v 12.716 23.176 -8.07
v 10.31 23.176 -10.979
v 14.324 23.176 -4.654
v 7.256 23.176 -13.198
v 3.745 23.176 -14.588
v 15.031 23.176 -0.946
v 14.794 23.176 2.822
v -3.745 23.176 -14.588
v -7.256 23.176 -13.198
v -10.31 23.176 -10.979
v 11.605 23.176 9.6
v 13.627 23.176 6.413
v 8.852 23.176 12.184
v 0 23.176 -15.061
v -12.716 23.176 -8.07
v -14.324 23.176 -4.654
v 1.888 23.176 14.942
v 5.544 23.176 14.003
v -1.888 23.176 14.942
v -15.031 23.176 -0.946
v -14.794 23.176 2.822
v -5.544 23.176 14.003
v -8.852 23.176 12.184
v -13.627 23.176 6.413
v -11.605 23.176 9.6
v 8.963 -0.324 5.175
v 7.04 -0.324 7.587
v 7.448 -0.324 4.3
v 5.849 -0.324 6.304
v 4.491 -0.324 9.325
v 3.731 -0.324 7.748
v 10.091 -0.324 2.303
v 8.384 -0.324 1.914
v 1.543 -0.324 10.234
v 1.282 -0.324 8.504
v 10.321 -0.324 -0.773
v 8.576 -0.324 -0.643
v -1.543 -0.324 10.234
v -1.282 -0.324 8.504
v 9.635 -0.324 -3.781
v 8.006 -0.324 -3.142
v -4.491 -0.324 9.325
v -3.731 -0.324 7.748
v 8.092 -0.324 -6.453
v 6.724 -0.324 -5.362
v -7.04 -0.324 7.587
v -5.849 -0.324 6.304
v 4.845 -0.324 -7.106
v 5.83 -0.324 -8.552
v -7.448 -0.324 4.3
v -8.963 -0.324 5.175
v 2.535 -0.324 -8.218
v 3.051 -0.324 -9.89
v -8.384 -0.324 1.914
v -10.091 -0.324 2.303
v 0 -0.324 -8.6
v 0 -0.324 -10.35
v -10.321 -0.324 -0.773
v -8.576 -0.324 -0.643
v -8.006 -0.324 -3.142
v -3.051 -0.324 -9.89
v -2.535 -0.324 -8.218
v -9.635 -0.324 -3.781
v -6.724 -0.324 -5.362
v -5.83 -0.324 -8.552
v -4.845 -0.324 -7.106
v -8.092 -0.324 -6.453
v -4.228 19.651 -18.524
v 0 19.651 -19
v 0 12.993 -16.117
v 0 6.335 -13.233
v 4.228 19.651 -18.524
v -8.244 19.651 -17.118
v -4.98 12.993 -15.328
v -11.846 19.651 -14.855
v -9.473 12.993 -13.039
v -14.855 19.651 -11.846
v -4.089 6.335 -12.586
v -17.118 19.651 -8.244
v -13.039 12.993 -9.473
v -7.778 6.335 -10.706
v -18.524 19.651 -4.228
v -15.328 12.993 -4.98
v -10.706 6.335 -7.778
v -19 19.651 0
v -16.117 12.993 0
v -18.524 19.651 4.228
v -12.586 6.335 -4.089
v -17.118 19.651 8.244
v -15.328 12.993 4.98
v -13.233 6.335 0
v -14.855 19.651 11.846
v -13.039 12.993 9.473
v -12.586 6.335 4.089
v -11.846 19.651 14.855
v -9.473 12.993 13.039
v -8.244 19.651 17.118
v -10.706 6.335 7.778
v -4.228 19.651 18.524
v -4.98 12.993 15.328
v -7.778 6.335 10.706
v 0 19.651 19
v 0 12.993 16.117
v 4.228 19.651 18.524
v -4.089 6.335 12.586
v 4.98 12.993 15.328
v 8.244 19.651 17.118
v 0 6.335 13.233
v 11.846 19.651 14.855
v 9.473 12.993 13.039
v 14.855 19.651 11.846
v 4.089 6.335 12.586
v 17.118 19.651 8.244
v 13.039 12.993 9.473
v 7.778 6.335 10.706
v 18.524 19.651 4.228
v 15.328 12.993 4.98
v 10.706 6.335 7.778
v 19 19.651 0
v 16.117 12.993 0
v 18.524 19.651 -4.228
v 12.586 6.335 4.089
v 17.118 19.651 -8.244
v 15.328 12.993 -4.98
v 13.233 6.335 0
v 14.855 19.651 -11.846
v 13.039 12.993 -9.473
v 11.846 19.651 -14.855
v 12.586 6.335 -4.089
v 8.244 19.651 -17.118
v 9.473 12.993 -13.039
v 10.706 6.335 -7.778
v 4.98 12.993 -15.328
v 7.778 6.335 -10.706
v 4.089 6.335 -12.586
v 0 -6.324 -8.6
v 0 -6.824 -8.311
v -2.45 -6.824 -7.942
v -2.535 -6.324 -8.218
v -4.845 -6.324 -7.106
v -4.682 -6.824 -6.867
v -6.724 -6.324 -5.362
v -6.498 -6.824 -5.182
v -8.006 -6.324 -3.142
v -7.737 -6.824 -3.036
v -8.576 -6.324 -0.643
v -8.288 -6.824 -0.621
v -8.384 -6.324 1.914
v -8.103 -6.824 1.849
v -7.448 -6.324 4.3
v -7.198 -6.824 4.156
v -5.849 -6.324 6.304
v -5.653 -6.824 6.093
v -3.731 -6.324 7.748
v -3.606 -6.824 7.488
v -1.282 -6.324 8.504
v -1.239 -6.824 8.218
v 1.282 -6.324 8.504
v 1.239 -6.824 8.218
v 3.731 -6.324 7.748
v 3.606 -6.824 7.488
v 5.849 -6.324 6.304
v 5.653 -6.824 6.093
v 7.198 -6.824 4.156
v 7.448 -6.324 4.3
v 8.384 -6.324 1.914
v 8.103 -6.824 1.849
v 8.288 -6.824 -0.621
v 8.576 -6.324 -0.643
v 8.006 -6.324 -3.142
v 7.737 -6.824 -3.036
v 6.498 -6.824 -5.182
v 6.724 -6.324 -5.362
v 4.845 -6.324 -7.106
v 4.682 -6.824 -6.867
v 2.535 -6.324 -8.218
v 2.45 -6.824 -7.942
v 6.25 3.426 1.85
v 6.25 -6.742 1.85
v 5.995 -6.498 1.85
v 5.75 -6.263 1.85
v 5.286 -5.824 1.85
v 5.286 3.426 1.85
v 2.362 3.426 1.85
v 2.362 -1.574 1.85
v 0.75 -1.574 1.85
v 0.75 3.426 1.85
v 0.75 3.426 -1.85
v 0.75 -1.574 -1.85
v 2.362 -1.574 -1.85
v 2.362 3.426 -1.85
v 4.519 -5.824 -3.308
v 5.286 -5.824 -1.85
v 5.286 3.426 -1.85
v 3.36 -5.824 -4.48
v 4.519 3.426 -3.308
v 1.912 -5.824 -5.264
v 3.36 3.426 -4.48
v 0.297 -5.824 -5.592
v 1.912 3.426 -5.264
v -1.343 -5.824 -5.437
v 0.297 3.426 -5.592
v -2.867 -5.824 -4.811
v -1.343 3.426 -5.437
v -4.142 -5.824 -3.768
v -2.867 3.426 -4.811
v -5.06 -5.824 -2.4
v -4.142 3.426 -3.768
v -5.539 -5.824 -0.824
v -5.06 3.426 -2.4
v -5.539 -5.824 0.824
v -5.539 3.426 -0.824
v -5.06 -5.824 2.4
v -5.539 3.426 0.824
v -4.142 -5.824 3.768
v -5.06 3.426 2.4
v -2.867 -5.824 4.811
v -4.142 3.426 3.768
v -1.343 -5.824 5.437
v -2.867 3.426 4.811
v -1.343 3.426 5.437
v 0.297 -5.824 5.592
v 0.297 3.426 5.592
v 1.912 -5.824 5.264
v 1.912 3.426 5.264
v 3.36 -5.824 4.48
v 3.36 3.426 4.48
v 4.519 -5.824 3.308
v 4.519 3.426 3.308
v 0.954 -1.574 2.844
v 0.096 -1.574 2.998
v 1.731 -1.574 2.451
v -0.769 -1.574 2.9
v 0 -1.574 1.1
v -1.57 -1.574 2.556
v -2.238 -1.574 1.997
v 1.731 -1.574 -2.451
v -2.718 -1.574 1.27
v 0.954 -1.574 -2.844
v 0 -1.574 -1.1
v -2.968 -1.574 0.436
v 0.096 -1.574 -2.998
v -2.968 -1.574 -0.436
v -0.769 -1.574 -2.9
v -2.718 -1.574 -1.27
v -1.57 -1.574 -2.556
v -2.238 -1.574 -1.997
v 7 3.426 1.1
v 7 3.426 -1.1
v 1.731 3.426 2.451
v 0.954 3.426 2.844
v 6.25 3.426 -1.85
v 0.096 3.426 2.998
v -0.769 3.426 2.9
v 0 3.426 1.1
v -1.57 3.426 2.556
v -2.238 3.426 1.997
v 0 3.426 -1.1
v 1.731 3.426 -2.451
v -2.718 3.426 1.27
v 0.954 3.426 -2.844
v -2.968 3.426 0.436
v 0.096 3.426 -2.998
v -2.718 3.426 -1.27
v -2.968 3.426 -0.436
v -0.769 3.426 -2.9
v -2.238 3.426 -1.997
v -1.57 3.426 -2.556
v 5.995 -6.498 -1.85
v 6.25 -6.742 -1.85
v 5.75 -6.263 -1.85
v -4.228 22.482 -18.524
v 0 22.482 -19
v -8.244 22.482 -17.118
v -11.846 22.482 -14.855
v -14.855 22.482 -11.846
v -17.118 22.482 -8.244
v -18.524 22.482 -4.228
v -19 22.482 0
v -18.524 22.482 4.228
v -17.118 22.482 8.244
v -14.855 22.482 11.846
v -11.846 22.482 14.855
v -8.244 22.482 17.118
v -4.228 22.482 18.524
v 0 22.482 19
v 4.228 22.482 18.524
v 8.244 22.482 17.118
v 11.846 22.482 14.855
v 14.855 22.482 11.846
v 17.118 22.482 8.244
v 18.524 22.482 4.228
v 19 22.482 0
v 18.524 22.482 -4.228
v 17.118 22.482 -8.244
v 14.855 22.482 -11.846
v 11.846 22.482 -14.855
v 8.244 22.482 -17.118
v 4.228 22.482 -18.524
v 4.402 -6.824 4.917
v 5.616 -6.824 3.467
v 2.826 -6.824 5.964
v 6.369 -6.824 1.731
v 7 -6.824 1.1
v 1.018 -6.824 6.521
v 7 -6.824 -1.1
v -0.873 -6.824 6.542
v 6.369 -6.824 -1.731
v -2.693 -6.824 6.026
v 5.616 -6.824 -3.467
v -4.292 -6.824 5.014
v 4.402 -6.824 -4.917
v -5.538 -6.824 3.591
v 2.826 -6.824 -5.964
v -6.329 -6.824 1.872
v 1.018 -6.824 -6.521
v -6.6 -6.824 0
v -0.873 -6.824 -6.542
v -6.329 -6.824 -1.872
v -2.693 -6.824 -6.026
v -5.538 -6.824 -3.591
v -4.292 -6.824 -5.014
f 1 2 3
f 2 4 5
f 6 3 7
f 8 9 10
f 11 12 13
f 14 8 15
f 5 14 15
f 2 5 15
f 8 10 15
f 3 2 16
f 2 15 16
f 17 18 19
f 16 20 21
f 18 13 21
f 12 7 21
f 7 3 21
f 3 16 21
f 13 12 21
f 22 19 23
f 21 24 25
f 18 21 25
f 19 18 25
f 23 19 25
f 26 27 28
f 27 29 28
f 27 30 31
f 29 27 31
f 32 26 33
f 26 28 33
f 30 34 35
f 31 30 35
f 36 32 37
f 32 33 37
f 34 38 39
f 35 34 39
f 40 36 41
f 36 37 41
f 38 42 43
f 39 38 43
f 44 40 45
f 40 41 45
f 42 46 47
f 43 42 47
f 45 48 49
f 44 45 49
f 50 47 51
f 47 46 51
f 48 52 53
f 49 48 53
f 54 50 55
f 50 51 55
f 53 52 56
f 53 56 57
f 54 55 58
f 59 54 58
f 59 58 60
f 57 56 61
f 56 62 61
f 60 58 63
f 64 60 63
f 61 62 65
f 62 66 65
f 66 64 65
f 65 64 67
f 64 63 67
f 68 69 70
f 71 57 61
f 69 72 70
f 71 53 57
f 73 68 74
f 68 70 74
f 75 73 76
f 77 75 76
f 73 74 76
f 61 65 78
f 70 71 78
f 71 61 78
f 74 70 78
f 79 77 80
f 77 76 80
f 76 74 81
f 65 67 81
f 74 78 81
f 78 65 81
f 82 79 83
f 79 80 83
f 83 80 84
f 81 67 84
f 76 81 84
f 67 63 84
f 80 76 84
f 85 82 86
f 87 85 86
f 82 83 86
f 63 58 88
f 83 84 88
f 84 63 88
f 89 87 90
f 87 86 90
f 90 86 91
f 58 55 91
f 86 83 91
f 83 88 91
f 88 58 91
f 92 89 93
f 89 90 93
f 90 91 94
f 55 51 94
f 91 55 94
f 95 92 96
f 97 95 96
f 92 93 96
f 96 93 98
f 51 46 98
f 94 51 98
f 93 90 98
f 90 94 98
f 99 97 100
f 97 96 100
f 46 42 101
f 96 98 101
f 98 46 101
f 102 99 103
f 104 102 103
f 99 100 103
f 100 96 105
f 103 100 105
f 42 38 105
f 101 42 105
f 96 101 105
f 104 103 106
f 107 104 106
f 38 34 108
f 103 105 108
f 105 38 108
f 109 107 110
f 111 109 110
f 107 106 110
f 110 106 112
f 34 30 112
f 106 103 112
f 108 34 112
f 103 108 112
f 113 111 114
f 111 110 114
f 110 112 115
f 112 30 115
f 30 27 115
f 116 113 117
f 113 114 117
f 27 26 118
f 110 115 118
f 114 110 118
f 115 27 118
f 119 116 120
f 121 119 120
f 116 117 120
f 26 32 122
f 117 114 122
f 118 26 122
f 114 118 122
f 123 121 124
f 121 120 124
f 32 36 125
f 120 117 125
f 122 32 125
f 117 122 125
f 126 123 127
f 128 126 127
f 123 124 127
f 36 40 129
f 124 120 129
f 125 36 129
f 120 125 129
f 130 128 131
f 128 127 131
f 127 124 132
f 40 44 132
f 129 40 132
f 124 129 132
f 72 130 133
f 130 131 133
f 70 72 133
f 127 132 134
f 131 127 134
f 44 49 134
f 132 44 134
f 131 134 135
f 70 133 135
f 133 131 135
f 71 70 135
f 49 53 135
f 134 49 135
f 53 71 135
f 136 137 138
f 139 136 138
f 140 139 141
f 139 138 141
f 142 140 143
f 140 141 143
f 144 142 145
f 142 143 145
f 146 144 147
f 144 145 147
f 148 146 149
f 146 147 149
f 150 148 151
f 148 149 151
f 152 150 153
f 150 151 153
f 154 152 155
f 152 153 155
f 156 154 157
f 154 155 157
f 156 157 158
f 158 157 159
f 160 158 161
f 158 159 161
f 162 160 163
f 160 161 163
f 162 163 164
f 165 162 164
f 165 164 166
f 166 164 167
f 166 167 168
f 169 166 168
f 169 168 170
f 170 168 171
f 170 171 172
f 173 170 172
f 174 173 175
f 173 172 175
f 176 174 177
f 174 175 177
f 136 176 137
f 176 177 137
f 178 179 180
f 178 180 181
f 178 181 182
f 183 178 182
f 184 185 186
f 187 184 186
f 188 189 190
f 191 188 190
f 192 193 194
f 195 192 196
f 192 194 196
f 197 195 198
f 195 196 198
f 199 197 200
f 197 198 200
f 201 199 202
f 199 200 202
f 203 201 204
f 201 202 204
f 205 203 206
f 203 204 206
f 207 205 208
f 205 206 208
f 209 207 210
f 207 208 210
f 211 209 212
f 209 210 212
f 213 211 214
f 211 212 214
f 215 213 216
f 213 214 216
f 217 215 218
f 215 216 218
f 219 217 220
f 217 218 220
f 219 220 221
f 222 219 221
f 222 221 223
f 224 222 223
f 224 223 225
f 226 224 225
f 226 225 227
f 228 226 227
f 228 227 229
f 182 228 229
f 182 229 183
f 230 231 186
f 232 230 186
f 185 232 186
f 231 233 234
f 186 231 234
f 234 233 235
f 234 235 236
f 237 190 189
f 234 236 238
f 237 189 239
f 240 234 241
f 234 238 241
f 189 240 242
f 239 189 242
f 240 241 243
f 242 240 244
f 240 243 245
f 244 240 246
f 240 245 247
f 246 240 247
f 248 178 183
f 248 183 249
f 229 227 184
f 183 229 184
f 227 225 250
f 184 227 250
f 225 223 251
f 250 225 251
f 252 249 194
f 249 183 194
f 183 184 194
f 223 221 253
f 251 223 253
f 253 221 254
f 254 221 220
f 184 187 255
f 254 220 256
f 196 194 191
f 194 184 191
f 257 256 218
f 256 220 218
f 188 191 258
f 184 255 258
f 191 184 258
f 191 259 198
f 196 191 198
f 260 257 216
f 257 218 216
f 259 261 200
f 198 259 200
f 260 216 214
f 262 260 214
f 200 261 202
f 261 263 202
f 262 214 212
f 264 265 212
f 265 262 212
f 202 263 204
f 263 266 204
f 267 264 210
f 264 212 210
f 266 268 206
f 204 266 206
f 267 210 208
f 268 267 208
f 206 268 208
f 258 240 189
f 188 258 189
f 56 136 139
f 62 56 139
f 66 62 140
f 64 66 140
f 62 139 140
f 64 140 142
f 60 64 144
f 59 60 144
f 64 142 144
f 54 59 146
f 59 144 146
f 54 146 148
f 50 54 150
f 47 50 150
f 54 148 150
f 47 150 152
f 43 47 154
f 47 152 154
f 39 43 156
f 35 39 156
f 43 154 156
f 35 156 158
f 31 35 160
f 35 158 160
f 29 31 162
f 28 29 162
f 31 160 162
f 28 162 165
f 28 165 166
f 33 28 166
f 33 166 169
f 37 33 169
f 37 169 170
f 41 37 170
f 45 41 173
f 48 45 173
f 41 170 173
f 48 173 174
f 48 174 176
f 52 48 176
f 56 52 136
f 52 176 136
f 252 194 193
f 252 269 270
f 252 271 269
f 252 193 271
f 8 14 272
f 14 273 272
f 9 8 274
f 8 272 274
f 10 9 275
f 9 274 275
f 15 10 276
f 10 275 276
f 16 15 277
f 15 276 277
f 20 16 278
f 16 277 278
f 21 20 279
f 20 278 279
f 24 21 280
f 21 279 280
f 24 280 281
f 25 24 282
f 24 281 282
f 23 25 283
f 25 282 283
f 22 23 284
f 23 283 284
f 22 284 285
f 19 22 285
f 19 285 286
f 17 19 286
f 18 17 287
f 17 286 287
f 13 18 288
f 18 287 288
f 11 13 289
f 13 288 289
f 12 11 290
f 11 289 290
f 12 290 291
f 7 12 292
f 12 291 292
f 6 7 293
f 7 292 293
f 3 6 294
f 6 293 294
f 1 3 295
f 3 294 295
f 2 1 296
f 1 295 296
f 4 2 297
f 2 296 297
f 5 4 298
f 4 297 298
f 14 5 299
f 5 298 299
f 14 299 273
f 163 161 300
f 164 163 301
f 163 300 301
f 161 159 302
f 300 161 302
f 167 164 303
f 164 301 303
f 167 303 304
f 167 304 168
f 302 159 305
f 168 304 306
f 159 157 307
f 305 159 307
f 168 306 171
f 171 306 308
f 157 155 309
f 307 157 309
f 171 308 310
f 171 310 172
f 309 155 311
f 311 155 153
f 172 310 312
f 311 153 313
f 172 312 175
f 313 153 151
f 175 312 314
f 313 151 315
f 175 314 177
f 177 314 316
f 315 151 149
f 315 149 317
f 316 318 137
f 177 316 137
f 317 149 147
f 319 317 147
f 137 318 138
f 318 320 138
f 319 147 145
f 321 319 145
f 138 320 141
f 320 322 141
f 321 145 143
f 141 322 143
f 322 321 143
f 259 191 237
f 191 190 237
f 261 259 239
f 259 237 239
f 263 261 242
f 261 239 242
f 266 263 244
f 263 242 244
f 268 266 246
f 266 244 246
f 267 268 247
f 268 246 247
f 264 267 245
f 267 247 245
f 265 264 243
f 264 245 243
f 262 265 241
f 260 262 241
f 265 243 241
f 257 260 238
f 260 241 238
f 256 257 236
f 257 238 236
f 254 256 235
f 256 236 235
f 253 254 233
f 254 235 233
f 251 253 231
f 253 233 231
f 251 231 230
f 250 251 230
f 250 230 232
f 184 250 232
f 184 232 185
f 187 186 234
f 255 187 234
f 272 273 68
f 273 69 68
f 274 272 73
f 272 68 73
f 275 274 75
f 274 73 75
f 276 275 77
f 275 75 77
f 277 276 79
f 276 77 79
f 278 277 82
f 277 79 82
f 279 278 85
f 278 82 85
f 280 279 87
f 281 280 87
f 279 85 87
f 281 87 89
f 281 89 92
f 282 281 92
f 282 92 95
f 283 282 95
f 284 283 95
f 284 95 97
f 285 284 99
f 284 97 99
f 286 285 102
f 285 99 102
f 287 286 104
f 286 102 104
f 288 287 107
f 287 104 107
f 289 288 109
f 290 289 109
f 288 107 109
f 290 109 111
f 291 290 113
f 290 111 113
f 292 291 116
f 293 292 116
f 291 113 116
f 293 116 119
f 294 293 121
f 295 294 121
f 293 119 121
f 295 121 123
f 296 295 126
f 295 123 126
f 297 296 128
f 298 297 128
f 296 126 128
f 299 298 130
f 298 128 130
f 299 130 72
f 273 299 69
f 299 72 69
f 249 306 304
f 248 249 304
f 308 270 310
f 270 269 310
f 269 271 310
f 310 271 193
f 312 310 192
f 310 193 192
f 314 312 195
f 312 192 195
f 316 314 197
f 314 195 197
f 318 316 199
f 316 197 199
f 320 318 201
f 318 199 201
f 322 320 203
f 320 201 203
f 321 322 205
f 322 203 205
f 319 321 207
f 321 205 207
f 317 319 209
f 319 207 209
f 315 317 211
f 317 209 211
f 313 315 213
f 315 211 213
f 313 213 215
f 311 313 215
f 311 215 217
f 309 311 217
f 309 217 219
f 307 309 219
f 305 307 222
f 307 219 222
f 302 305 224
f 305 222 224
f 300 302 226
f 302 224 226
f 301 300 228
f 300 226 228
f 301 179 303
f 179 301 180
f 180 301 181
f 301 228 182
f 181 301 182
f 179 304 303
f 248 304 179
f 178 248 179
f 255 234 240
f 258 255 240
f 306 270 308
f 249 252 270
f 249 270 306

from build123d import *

# Parameters (mm, degrees)
CUT_EXTRUDE1_REACH             = 38.532
CUT_EXTRUDE1_DIRECTION_2_REACH = 38.532
CHAMFER1_SIZE                  = 1
CHAMFER2_SIZE                  = 0.5
CHAMFER2_SIZE2                 = 0.288675135


with BuildPart() as part:
    # Sketch1 → Revolve1 (revolve)
    with BuildSketch(Plane.XY, mode=Mode.PRIVATE) as revolve1_sk:
        Polygon((-15.060768988, 23.176328976), (-19, 22.481736265), (-19, 19.651328976), (-10.35, -0.323671024), (-8.6, -0.323671024), (-8.6, -6.823671024), (-5.6, -6.823671024), (-5.6, 3.426328976), (-3, 3.426328976), (-3, -1.573671024), (0, -1.573671024), (0, 23.176328976), align=None)
    revolve(revolve1_sk.sketch.rotate(Axis((0, -1.573671024, 0), (0, 1, 0)), 270), axis=Axis((0, -1.573671024, 0), (0, 1, 0)))

    # Cut-Extrude1: up to this face of the body (flat: up to its plane)
    cut_extrude1_end = Plane(part.part.faces().sort_by_distance((0, 3.426328976, 5.441608081))[0])
    # Sketch3 → Cut-Extrude1 (cut, up to the picked face)
    with BuildSketch(Plane.XZ.offset(1.573671024), mode=Mode.PRIVATE) as cut_extrude1_sk1:
        Polygon((0.75, 1.85), (0, 1.1), (0, -1.1), (0.75, -1.85), (6.25, -1.85), (7, -1.1), (7, 1.1), (6.25, 1.85), align=None)
    cut_extrude1_tool1 = split(extrude(cut_extrude1_sk1.sketch, amount=-CUT_EXTRUDE1_REACH, mode=Mode.PRIVATE), bisect_by=cut_extrude1_end, keep=Keep.BOTH, mode=Mode.PRIVATE)
    add(cut_extrude1_tool1.solids().sort_by(Axis((3.5, -1.573671, 0), (0, 1, 0)))[0], mode=Mode.SUBTRACT)

    # Cut-Extrude1 direction 2: up to this face of the body (flat: up to its plane)
    cut_extrude1_direction_2_end = Plane(part.part.faces().sort_by_distance((0, -6.823671024, 8.356755267))[0])
    # Sketch3 → Cut-Extrude1 direction 2 (cut, up to the picked face)
    with BuildSketch(Plane.XZ.offset(1.573671024), mode=Mode.PRIVATE) as cut_extrude1_direction_2_sk1:
        Polygon((0.75, 1.85), (0, 1.1), (0, -1.1), (0.75, -1.85), (6.25, -1.85), (7, -1.1), (7, 1.1), (6.25, 1.85), align=None)
    cut_extrude1_direction_2_tool1 = split(extrude(cut_extrude1_direction_2_sk1.sketch, amount=CUT_EXTRUDE1_DIRECTION_2_REACH, mode=Mode.PRIVATE), bisect_by=cut_extrude1_direction_2_end, keep=Keep.BOTH, mode=Mode.PRIVATE)
    add(cut_extrude1_direction_2_tool1.solids().sort_by(Axis((3.5, -1.573671, 0), (0, -1, 0)))[0], mode=Mode.SUBTRACT)

    # Chamfer1
    chamfer1_edges = [part.edges().sort_by_distance(p)[0] for p in [
        (-5.6, -6.823671024, 0),
    ]]
    chamfer(chamfer1_edges, length=CHAMFER1_SIZE)

    # Chamfer2
    chamfer2_edges = [part.edges().sort_by_distance(p)[0] for p in [
        (0, -6.823671024, 8.6),
    ]]
    chamfer2_side = [part.faces().sort_by_distance(p)[0] for p in [
        (0, -3.573671024, 8.6),
    ]]
    chamfer(chamfer2_edges, length=CHAMFER2_SIZE, length2=CHAMFER2_SIZE2, reference=chamfer2_side[0])


solid = part.part
